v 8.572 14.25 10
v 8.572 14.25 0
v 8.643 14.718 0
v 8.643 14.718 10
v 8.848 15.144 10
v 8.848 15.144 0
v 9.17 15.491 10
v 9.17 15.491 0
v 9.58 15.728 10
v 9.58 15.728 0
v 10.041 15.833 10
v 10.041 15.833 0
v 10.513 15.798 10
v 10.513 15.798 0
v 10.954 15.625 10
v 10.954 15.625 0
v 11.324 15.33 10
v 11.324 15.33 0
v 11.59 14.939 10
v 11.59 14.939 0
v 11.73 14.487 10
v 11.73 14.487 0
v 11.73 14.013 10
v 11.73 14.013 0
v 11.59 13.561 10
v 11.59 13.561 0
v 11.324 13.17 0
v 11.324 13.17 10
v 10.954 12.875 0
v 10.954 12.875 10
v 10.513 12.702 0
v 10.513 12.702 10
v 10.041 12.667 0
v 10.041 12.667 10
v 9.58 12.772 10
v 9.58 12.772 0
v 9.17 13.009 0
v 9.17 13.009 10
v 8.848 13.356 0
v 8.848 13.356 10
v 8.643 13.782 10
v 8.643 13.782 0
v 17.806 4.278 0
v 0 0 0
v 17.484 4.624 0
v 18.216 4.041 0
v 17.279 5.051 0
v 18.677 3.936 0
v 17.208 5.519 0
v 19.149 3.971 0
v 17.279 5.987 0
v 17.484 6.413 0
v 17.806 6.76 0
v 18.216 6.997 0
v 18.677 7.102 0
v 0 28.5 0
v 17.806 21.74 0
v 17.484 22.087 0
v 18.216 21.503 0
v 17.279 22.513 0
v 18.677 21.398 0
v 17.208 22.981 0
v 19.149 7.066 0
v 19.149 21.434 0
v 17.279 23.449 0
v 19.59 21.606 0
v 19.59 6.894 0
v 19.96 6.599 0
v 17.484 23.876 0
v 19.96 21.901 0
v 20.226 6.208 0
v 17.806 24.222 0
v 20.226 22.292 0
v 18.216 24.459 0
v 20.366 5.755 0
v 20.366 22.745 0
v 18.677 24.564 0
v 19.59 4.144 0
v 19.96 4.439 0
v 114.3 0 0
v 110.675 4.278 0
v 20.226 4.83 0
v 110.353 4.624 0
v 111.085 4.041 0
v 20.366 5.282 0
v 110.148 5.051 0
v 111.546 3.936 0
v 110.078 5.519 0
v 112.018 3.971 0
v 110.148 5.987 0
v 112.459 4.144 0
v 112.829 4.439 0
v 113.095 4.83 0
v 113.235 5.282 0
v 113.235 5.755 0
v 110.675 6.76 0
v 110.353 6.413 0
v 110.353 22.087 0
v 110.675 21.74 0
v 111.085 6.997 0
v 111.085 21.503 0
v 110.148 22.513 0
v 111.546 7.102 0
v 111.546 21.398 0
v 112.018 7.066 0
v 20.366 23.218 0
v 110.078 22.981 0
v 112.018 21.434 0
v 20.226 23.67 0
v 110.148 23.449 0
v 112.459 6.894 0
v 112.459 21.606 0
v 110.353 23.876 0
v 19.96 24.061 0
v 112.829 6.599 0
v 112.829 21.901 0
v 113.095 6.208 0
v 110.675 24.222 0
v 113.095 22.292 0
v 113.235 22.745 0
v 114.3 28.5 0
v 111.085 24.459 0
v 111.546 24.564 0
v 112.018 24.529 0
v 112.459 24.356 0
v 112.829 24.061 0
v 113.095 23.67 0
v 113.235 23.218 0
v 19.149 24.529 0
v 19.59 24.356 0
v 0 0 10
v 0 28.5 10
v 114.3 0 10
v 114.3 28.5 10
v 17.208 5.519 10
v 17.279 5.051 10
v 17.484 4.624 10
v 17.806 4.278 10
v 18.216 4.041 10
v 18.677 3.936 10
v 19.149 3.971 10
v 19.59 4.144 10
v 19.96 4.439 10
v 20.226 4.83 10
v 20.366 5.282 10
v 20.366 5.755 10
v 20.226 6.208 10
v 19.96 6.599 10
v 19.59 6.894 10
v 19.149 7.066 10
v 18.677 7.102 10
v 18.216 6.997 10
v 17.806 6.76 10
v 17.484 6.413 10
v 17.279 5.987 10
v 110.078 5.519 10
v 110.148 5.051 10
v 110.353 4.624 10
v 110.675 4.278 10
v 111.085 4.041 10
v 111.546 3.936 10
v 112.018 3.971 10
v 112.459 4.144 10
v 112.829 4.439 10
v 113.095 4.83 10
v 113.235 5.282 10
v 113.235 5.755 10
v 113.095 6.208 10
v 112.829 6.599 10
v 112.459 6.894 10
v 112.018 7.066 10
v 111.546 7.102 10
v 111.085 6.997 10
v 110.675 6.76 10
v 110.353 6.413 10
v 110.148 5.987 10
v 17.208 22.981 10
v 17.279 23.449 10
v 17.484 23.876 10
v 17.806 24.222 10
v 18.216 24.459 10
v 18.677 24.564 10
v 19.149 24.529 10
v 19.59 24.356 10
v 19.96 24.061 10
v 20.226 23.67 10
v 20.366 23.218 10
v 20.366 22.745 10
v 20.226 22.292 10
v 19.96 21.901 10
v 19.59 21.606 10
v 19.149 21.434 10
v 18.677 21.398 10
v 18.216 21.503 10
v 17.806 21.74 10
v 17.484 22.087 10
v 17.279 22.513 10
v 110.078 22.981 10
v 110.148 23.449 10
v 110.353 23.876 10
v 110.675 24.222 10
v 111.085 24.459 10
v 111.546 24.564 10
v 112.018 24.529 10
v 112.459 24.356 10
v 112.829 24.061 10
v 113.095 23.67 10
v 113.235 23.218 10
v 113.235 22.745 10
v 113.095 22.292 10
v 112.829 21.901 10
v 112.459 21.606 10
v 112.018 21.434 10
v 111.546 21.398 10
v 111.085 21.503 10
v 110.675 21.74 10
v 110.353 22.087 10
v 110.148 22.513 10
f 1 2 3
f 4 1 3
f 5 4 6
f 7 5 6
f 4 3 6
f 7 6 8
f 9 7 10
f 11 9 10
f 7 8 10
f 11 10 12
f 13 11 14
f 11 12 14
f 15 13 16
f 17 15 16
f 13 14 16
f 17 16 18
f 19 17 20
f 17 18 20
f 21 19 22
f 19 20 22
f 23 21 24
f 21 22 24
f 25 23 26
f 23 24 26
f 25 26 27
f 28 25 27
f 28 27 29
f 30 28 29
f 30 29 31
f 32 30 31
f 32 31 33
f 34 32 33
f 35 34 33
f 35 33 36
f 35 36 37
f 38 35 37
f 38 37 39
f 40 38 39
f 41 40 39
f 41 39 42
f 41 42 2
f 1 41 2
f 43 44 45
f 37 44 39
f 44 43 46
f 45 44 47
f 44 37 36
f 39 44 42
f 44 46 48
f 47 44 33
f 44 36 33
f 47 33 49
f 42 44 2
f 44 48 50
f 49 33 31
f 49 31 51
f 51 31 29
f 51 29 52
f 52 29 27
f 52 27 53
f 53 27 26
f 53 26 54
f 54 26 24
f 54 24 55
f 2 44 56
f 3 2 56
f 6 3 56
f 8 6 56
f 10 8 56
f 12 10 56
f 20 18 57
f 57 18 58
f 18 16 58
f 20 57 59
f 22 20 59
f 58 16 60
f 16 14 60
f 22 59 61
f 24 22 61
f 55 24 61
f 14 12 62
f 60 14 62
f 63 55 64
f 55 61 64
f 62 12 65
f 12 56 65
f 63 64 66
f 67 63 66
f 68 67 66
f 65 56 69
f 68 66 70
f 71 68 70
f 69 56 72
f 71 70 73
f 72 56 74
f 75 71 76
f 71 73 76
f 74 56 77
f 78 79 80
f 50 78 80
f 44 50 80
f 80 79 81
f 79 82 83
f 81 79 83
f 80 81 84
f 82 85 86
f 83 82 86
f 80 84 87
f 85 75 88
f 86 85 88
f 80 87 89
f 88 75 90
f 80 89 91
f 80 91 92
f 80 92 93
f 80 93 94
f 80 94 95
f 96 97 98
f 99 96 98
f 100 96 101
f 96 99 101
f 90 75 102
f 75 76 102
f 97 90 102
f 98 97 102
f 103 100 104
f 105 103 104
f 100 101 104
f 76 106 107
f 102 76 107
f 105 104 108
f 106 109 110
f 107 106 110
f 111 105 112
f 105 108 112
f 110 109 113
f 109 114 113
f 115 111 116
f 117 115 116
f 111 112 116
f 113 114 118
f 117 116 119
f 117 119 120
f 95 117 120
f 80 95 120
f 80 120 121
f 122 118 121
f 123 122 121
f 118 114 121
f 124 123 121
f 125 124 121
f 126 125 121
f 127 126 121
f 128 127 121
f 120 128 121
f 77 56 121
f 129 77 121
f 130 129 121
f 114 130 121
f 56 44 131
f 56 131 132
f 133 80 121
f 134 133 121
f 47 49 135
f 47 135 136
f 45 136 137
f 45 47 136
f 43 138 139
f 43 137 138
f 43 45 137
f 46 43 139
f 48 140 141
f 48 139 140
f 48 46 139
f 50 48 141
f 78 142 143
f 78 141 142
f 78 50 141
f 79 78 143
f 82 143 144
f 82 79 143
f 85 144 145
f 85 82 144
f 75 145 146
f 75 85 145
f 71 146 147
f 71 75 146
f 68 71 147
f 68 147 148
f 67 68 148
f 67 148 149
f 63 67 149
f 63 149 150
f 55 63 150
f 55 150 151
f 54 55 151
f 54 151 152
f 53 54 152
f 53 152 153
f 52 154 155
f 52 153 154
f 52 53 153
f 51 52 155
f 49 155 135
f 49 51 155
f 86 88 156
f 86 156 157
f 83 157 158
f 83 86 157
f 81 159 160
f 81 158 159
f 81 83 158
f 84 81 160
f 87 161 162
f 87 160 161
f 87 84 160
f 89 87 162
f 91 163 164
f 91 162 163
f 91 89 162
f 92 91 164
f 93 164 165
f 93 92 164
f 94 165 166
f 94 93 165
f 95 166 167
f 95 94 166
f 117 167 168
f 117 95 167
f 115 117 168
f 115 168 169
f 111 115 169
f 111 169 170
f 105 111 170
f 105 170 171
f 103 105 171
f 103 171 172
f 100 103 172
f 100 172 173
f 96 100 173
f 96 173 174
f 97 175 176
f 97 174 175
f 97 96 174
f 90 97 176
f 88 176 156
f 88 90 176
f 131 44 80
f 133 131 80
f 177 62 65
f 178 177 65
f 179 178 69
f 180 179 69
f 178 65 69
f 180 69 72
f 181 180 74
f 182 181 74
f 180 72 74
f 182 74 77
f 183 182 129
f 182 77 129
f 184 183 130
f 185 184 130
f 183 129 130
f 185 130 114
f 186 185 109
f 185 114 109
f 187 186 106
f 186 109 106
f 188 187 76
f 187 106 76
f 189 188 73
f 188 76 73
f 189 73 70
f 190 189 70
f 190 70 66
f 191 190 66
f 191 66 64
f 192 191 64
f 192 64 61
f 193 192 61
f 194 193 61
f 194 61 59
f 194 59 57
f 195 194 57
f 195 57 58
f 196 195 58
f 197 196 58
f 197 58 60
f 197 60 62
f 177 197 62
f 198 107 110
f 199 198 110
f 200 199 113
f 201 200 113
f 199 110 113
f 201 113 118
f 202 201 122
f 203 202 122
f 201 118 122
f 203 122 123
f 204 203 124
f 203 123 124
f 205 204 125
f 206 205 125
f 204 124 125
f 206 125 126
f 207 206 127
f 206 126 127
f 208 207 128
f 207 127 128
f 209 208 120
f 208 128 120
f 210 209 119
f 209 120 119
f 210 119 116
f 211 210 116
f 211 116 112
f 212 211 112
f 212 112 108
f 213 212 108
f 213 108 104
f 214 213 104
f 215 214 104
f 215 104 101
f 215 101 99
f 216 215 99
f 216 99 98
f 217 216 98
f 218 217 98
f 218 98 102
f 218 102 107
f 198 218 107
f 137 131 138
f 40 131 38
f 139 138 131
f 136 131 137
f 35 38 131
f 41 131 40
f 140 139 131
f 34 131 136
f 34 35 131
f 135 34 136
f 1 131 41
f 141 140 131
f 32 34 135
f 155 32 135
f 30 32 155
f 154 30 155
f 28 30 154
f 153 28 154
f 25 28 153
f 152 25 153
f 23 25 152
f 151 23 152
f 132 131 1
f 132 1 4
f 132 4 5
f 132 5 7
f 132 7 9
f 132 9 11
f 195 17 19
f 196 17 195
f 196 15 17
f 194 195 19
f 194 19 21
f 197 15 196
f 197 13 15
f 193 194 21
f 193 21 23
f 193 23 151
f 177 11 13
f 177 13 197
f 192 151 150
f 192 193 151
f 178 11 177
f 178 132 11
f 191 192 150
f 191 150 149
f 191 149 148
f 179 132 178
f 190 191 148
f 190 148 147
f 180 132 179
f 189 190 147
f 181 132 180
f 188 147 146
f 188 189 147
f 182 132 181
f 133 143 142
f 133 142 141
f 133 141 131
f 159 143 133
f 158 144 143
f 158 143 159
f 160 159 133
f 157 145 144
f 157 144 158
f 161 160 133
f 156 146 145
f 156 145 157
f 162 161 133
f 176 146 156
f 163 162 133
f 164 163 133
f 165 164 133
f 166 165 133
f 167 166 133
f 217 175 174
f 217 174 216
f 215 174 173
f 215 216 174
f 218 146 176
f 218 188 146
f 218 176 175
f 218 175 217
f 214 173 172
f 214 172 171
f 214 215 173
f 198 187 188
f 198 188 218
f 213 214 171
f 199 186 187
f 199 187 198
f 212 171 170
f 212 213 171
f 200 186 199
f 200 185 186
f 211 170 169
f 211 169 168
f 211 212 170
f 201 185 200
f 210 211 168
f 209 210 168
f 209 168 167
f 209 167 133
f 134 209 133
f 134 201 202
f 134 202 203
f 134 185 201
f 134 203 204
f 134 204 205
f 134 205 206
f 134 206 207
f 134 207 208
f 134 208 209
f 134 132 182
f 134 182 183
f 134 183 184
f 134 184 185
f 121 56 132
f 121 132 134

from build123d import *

# Parameters (mm, degrees)
SKETCH_1_W      = 114.3
SKETCH_1_H      = 28.5
EXTRUDE_1_DEPTH = 10
HOLE_WIZARD_1_D = 3.175


with BuildPart() as part:
    # 스케치1 → 보스-돌출1 (new body)
    with BuildSketch(Plane.XY):
        with Locations((57.15, 14.25)):
            Rectangle(SKETCH_1_W, SKETCH_1_H)
    extrude(amount=EXTRUDE_1_DEPTH)

    # 구멍1 (through all)
    with Locations(Plane.XY.offset(10)):
        with Locations((18.796, 22.98125), (111.665004, 22.98125), (10.16, 14.25)):
            hole_wizard_1 = Hole(HOLE_WIZARD_1_D / 2)

    # 대칭 복사1: 구멍1 across plane
    add(hole_wizard_1.mirror(Plane.ZX.offset(14.25)), mode=Mode.SUBTRACT)


solid = part.part
